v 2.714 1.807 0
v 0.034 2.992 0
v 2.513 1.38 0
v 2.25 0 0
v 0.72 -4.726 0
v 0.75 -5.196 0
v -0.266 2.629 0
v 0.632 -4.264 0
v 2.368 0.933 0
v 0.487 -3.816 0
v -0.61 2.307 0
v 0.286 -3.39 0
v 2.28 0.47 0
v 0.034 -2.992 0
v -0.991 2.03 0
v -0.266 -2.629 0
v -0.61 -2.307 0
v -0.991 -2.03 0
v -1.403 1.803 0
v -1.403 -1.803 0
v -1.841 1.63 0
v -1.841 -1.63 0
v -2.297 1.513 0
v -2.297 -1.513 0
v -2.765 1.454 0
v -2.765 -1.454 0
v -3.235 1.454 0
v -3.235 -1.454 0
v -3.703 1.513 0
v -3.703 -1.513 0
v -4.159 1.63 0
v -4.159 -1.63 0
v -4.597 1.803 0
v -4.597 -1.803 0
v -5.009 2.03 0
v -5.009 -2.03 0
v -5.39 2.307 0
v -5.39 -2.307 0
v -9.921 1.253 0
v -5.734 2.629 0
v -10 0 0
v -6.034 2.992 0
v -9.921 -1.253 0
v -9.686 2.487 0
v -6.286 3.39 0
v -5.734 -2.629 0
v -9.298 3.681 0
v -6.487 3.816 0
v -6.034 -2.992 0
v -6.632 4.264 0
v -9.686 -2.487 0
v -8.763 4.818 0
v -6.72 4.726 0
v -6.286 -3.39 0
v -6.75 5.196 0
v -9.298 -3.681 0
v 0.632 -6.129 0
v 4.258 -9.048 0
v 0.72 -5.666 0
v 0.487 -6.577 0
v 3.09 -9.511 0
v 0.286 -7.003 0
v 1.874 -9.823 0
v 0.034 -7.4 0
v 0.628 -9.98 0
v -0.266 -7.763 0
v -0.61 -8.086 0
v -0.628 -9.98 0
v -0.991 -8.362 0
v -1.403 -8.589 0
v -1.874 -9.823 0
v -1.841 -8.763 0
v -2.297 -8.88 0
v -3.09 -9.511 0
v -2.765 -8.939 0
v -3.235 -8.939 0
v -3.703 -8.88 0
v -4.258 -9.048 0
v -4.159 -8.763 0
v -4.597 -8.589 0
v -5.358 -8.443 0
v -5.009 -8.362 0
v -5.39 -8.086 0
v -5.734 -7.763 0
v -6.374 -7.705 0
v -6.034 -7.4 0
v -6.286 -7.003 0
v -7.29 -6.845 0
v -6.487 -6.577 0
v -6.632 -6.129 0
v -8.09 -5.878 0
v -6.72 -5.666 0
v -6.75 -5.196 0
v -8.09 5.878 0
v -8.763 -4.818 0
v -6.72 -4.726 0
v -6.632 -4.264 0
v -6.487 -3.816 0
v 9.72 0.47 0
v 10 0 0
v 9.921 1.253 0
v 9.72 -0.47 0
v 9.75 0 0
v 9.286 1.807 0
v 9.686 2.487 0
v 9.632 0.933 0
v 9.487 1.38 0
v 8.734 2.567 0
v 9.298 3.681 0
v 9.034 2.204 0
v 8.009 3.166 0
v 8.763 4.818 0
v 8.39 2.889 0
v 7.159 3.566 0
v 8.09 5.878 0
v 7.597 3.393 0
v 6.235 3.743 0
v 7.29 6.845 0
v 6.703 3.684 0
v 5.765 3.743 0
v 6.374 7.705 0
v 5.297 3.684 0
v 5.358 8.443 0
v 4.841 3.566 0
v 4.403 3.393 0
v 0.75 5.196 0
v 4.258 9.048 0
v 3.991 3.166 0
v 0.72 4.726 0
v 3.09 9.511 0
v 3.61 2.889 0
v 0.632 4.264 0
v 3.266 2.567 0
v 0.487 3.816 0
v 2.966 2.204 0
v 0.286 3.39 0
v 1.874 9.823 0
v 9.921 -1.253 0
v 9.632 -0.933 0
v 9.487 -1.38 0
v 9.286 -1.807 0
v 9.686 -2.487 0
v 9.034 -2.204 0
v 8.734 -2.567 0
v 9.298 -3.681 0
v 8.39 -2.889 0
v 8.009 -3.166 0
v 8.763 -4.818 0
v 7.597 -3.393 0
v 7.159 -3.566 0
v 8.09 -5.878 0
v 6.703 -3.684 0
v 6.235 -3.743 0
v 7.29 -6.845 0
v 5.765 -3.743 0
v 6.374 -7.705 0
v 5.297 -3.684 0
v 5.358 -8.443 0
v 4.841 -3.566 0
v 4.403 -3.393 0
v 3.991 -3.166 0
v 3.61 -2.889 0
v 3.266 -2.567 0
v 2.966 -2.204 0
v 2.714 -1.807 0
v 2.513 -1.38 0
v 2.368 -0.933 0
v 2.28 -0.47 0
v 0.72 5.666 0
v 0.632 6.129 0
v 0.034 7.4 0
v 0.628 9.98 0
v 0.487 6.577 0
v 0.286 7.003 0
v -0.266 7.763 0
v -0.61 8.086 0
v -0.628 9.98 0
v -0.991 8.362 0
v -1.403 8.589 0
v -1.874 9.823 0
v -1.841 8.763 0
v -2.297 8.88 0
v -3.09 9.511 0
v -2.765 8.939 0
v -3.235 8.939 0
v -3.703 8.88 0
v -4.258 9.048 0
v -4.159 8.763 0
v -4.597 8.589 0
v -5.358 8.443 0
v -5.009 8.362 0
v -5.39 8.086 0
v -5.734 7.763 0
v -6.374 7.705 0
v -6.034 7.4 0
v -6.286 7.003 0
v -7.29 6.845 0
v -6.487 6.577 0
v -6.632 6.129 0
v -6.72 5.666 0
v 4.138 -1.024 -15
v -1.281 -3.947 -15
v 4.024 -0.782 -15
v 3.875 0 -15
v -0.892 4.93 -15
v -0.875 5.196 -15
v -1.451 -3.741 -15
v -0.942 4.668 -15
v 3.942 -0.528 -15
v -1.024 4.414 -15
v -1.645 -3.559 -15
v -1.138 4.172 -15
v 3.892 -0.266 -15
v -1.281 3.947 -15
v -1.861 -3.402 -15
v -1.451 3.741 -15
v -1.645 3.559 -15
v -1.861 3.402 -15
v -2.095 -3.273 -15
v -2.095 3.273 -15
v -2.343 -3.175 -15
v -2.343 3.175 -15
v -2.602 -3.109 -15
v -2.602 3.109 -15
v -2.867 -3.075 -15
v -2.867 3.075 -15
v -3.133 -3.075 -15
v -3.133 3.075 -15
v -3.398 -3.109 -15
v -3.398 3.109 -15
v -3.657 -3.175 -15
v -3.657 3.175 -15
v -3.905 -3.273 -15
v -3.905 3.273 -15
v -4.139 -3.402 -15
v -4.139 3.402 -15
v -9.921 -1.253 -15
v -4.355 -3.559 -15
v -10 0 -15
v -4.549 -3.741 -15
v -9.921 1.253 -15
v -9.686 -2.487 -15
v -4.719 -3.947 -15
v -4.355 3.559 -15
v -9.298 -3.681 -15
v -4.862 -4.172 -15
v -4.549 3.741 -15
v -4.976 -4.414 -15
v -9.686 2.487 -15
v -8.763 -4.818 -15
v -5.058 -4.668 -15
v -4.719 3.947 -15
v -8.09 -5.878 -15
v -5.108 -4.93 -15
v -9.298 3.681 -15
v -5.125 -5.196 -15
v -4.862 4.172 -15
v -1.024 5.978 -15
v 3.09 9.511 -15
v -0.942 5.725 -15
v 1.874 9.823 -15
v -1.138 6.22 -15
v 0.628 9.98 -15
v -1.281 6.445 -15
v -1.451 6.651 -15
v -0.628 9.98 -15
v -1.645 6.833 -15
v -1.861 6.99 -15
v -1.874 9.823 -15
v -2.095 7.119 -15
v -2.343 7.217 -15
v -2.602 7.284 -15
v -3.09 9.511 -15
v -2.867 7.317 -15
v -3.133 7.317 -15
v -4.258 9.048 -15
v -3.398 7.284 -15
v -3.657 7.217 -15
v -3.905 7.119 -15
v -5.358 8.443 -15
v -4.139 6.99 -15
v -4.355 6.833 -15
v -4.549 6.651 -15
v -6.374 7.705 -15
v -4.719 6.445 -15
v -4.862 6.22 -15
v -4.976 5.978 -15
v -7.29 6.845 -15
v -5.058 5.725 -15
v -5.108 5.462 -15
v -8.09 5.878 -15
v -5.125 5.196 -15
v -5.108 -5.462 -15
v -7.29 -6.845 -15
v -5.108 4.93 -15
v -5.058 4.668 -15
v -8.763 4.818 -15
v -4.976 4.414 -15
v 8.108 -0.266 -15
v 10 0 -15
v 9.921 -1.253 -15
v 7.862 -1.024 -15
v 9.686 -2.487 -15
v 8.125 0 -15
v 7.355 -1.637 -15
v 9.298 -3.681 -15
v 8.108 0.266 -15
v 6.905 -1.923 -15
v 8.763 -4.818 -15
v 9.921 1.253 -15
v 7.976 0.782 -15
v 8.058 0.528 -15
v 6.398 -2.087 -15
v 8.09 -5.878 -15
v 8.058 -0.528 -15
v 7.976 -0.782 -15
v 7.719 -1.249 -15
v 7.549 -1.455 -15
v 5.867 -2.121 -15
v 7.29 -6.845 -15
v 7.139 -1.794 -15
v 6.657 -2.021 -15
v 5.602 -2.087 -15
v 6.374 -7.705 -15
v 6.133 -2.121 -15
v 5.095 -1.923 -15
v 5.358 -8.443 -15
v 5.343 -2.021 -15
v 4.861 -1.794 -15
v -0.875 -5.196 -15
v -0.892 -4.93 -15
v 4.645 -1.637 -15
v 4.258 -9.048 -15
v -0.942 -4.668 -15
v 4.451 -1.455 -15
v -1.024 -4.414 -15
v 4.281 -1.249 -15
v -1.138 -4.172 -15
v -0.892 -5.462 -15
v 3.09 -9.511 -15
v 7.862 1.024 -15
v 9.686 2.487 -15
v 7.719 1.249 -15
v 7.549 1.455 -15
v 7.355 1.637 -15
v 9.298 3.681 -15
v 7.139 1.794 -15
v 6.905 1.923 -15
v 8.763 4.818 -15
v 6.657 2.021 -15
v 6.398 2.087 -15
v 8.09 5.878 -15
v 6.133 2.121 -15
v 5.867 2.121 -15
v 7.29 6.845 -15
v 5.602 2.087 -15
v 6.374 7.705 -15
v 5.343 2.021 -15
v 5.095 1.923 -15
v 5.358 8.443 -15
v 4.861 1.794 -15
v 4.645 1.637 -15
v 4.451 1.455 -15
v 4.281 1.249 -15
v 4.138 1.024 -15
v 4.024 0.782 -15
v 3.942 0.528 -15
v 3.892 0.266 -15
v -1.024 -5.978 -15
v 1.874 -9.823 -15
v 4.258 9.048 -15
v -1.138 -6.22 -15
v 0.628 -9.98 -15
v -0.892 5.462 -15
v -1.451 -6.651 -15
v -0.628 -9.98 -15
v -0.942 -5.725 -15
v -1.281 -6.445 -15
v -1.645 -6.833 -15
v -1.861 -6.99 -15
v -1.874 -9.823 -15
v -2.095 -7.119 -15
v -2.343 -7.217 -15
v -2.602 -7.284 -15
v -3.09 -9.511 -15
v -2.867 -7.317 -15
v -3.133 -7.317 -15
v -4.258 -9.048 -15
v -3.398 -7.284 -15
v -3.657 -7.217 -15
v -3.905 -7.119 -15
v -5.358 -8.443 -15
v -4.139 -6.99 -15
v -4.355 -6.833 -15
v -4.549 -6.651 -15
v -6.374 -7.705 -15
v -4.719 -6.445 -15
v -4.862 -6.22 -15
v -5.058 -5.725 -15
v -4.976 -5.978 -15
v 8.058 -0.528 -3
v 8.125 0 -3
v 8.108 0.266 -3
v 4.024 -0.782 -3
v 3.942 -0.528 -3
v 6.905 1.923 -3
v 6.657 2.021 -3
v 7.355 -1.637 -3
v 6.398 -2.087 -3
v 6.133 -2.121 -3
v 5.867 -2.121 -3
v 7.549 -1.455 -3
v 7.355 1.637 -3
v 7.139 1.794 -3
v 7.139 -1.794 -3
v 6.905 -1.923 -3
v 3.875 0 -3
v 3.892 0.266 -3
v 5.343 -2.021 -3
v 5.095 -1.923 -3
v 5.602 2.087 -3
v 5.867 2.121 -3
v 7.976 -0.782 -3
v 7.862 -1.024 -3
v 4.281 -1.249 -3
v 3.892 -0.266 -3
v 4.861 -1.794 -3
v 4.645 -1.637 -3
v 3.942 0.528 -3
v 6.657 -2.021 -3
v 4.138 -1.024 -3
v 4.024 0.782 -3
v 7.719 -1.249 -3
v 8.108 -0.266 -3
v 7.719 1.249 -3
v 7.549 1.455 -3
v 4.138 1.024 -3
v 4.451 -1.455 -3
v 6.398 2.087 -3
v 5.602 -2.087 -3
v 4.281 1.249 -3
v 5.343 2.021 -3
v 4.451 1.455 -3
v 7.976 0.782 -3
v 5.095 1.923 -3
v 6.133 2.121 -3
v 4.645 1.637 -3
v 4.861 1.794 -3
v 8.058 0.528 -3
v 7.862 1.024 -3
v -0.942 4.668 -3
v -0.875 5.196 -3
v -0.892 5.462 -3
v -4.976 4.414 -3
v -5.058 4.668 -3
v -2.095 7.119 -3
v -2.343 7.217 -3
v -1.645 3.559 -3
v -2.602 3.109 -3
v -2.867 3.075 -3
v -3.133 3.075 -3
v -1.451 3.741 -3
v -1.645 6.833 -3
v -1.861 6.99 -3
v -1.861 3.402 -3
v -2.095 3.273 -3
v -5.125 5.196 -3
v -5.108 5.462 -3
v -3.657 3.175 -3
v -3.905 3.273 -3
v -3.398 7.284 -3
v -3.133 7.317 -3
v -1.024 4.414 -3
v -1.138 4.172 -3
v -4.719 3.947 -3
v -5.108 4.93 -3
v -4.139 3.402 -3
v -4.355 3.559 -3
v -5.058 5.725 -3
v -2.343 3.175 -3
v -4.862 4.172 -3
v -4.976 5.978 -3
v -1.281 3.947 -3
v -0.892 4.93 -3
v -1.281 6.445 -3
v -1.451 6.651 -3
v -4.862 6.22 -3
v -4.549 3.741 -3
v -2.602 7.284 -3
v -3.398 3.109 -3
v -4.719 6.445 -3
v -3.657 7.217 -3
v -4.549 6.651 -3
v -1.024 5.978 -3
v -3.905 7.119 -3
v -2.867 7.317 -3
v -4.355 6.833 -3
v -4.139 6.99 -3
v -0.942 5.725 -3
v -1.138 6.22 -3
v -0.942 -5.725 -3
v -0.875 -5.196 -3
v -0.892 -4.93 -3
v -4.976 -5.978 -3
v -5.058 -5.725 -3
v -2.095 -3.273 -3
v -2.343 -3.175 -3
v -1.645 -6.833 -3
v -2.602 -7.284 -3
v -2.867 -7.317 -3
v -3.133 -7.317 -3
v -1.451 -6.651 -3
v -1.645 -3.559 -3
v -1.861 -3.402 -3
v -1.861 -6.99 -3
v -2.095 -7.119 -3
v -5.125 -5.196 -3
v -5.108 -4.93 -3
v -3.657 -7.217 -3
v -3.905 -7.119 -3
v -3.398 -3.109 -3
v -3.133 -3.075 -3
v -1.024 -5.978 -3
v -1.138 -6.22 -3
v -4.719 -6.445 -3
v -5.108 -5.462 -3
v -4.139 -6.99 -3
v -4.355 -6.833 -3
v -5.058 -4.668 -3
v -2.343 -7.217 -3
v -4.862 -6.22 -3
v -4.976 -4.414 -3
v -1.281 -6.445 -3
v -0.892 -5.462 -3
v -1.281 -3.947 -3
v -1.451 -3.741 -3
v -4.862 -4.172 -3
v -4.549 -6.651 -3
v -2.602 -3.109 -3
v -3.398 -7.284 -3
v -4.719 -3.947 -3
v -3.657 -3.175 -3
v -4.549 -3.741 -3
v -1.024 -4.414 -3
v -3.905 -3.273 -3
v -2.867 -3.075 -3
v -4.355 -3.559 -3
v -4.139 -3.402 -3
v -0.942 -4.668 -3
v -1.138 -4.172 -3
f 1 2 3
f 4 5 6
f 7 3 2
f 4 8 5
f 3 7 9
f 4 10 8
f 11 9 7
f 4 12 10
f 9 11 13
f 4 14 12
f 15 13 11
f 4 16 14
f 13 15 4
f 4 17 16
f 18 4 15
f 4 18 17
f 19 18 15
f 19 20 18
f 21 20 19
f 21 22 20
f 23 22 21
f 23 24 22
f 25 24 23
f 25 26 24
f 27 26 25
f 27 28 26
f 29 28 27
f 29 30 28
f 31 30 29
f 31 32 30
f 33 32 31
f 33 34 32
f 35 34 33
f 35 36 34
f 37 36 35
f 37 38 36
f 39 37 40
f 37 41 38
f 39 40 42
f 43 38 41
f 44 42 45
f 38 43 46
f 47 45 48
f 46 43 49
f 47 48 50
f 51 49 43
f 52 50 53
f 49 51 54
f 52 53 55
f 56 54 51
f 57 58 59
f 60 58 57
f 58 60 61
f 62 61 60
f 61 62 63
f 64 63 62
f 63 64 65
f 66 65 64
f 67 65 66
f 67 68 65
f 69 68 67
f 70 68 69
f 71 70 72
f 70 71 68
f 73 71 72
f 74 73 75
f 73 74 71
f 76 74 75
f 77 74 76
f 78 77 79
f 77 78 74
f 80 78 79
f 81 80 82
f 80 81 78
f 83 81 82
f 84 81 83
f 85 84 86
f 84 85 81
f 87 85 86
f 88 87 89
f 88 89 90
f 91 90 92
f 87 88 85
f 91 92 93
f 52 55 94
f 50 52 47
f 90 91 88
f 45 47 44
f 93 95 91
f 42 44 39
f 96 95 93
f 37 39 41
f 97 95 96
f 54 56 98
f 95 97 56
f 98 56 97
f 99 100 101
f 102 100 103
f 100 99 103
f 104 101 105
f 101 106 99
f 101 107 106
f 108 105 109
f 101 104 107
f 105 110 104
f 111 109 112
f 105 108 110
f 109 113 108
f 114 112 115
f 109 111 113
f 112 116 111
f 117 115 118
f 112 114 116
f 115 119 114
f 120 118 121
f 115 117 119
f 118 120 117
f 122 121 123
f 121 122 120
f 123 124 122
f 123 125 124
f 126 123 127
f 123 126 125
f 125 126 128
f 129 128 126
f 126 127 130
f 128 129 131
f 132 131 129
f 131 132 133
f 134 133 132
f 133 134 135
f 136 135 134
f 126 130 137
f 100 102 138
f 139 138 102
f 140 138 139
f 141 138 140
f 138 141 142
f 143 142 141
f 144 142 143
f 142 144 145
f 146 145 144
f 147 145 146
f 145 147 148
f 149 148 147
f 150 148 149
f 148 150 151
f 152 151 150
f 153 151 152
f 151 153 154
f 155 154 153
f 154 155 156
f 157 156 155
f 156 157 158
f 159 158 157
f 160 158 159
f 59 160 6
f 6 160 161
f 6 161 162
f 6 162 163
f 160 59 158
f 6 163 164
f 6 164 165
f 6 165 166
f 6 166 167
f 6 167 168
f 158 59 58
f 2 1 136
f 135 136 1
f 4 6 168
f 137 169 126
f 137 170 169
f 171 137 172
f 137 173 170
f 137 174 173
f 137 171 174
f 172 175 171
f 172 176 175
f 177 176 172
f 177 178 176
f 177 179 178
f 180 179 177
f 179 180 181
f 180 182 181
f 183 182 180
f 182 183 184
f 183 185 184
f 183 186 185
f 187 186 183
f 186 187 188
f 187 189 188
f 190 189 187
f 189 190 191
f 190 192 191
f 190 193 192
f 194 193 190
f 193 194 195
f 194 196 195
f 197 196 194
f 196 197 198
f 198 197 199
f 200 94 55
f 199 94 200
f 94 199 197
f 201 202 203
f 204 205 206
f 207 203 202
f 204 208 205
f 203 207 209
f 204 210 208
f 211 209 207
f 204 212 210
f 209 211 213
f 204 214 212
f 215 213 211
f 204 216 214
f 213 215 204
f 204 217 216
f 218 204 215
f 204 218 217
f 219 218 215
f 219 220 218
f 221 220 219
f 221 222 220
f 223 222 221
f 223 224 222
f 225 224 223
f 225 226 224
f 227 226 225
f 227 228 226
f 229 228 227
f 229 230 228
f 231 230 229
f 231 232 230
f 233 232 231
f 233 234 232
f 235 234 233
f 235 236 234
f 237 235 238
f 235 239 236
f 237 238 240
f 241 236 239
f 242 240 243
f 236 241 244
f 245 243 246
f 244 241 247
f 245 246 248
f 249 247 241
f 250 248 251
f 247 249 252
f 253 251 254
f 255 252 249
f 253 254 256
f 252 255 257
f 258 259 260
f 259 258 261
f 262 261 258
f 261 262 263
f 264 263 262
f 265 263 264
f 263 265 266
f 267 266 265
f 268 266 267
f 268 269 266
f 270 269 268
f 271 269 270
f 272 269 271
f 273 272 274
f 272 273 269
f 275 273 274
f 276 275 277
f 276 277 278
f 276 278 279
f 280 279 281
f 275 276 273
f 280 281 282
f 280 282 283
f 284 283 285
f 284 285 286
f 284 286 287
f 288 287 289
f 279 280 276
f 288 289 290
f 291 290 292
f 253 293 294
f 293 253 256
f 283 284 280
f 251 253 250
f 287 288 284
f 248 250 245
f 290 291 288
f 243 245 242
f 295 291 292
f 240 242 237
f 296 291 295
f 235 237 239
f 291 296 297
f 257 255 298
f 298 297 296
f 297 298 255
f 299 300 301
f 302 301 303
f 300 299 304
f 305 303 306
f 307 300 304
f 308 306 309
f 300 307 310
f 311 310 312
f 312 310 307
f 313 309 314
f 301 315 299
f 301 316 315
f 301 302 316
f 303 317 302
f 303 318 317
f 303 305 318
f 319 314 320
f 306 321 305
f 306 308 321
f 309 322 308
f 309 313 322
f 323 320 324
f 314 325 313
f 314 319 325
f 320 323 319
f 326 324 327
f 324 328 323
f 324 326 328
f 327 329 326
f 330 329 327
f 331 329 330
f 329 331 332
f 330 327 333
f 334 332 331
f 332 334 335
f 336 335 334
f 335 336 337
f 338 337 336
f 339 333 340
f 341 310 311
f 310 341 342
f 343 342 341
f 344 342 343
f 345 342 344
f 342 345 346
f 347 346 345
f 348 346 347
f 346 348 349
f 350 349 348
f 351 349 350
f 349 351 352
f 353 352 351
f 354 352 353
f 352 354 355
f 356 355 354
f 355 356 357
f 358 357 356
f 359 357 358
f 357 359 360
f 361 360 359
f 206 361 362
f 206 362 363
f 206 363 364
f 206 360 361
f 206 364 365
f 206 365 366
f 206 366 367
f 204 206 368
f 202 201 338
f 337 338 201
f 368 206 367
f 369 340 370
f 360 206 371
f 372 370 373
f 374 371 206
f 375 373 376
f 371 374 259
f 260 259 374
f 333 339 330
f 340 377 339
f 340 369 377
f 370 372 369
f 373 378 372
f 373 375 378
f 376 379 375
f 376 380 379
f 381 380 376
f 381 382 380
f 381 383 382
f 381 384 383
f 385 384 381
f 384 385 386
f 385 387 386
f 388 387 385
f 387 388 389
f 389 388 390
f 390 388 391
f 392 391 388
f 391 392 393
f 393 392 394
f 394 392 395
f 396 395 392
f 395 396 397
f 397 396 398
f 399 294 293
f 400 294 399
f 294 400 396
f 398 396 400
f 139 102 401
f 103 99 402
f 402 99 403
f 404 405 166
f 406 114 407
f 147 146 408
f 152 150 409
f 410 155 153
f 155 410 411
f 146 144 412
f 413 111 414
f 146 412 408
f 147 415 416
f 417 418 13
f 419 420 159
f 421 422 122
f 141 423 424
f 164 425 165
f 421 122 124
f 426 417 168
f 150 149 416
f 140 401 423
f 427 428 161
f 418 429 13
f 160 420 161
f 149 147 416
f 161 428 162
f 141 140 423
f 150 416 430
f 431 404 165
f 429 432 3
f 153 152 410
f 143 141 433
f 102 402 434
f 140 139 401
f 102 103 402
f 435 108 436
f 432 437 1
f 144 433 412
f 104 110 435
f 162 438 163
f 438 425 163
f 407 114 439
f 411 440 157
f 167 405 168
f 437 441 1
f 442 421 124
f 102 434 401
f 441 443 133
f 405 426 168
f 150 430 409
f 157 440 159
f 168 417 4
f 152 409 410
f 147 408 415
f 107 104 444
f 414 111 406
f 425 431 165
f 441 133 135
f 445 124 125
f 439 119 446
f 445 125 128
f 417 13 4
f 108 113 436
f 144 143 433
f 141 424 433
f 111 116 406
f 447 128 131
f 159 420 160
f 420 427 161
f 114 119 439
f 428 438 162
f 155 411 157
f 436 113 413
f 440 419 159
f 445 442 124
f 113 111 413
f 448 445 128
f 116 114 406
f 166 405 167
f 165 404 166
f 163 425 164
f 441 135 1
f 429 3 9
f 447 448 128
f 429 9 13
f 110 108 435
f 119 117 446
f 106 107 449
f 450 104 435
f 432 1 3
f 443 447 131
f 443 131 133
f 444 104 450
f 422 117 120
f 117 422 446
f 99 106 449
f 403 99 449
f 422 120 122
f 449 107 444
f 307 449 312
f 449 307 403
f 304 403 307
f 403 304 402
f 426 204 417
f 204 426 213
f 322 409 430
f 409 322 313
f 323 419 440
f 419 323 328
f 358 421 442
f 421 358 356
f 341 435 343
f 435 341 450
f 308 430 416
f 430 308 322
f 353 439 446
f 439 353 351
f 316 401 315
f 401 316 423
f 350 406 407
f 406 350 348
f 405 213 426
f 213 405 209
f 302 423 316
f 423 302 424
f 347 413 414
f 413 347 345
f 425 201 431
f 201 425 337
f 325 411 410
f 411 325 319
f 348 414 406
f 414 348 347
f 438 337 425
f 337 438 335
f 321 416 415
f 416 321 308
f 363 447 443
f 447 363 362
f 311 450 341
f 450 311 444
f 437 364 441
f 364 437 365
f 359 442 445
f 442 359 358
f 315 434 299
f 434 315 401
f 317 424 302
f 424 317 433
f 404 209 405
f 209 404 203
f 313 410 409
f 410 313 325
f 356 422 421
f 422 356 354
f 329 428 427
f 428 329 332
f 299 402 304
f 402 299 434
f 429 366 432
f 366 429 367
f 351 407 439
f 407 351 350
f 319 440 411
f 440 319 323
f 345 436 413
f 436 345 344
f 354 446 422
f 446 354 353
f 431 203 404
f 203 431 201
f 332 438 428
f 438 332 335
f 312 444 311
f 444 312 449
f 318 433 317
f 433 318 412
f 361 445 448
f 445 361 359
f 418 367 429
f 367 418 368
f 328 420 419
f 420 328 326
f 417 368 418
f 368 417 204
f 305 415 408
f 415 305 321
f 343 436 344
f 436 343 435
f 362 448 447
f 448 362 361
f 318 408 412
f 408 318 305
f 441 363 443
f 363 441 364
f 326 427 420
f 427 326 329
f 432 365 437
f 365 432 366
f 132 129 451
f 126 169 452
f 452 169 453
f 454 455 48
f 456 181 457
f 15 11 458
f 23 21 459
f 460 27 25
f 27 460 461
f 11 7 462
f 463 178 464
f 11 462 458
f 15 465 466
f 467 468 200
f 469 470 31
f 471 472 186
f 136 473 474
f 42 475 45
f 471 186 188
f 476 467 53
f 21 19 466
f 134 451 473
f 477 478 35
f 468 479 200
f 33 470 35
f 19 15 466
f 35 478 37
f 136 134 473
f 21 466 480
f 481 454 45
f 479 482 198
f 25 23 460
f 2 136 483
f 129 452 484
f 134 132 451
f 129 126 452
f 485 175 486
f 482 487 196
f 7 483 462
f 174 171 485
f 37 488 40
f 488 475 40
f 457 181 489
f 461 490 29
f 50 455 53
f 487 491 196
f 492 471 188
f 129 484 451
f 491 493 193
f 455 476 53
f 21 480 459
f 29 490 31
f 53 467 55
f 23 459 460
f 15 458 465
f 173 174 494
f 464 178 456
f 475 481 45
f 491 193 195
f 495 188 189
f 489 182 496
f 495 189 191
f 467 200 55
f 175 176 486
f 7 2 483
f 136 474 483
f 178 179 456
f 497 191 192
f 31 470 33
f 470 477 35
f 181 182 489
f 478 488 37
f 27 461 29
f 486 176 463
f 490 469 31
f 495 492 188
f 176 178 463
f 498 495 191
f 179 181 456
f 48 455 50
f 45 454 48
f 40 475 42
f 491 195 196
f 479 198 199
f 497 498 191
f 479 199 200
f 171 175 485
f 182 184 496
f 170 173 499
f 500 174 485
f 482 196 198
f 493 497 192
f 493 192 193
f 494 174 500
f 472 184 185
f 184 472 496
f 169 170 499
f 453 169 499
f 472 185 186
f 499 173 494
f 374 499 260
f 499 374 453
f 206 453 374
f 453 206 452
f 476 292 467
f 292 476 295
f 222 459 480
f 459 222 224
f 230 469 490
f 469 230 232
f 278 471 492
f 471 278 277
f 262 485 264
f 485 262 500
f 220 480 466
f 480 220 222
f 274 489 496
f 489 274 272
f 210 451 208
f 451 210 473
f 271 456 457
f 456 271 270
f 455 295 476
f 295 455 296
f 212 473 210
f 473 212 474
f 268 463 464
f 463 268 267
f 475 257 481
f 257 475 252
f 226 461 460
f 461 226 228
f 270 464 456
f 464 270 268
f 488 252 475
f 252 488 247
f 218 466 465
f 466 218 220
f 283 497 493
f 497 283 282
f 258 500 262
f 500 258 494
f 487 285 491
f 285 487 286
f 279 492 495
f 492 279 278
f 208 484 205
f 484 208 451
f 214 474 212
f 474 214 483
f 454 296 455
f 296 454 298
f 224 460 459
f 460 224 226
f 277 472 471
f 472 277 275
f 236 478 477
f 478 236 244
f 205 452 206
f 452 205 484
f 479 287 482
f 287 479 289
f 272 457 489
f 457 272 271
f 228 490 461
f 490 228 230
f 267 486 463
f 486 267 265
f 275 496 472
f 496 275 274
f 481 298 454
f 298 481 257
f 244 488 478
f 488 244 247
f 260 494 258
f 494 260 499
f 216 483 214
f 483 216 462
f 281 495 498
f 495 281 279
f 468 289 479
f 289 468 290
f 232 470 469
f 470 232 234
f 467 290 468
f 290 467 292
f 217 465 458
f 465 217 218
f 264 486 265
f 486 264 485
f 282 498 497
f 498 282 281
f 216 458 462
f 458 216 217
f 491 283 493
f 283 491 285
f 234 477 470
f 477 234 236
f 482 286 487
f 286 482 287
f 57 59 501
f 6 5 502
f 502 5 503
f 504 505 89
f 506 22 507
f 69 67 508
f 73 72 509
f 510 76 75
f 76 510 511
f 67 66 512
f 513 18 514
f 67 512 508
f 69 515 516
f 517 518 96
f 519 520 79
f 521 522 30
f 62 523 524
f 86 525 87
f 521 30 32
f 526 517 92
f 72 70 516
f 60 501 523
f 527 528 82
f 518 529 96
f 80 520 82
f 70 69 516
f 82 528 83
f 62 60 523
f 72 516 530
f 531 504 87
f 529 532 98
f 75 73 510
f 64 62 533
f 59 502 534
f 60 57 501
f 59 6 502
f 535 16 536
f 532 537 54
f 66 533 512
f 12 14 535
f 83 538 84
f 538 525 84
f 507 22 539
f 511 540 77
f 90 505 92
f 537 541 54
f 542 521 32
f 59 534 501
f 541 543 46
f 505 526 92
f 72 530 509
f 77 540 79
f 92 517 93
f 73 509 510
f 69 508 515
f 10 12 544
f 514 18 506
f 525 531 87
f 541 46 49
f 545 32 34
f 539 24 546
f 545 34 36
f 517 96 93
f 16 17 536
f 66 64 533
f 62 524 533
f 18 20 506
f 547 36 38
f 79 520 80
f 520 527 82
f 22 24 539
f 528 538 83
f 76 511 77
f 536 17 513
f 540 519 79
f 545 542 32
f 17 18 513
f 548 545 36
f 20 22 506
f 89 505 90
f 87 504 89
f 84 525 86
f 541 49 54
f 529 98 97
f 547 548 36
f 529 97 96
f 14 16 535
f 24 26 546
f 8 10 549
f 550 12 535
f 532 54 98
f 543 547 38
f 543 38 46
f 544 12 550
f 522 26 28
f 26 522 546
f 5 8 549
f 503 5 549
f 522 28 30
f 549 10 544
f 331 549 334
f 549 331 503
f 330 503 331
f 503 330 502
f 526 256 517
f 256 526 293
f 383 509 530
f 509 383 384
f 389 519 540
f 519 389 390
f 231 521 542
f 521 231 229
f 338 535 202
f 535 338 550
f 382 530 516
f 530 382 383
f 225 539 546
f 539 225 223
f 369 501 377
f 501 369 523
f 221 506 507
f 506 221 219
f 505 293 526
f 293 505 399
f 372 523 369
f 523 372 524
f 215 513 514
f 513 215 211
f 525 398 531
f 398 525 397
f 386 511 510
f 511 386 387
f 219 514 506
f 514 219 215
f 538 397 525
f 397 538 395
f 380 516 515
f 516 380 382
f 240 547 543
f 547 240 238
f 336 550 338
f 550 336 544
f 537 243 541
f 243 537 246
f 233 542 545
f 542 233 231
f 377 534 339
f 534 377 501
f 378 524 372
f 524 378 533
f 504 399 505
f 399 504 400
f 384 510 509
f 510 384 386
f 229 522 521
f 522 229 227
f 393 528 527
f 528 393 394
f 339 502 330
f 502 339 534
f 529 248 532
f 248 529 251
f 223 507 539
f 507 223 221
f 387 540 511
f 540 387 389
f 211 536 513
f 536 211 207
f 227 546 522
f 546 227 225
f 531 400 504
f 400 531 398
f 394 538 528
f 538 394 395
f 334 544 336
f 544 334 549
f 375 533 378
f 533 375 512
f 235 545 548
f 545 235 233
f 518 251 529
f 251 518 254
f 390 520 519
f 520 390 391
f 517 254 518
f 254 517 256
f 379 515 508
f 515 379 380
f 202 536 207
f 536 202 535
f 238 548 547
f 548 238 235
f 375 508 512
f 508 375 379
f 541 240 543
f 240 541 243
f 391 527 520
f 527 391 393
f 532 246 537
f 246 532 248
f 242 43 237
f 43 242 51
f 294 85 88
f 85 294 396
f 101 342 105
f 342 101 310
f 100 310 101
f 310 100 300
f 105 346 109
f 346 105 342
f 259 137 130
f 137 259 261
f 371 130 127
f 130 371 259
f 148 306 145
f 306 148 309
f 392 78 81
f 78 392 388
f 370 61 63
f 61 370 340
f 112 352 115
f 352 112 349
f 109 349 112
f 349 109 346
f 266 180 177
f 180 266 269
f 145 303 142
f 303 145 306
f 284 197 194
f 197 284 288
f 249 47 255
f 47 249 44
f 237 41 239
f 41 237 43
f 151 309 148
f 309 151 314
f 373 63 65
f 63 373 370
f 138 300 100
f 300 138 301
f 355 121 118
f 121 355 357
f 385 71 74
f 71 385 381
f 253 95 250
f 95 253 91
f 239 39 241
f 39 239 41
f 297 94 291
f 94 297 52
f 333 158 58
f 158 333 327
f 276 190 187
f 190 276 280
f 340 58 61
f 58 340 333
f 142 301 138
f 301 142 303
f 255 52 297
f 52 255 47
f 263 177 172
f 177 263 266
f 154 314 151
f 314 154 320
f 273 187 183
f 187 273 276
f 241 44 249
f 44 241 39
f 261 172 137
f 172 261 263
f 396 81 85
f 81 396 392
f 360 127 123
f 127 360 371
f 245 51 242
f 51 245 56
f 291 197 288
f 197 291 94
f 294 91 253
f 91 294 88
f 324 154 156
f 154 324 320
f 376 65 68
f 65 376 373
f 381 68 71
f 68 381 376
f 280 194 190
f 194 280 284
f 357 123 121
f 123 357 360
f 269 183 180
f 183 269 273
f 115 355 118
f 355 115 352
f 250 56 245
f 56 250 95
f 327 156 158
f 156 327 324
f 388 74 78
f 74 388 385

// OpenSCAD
$fn = 50;


difference() {
	union() {
		translate(v = [0, 0, -15.0000000000]) {
			cylinder(h = 15, r = 10.0000000000);
		}
	}
	union() {
		translate(v = [6.0000000000, 0.0000000000, 0]) {
			rotate(a = [0, 0, 0]) {
				difference() {
					union() {
						#translate(v = [0, 0, -15.0000000000]) {
							cylinder(h = 15, r = 2.0000000000);
						}
						#translate(v = [0, 0, -3]) {
							cylinder(h = 3, r = 10.0000000000, r1 = 2.1250000000, r2 = 3.7500000000);
						}
						#translate(v = [0, 0, -15.0000000000]) {
							cylinder(h = 15, r = 2.1250000000);
						}
						#translate(v = [0, 0, -15.0000000000]) {
							cylinder(h = 15, r = 2.0000000000);
						}
					}
					union();
				}
			}
		}
		translate(v = [-3.0000000000, 5.1961524227, 0]) {
			rotate(a = [0, 0, 0]) {
				difference() {
					union() {
						#translate(v = [0, 0, -15.0000000000]) {
							cylinder(h = 15, r = 2.0000000000);
						}
						#translate(v = [0, 0, -3]) {
							cylinder(h = 3, r = 10.0000000000, r1 = 2.1250000000, r2 = 3.7500000000);
						}
						#translate(v = [0, 0, -15.0000000000]) {
							cylinder(h = 15, r = 2.1250000000);
						}
						#translate(v = [0, 0, -15.0000000000]) {
							cylinder(h = 15, r = 2.0000000000);
						}
					}
					union();
				}
			}
		}
		translate(v = [-3.0000000000, -5.1961524227, 0]) {
			rotate(a = [0, 0, 0]) {
				difference() {
					union() {
						#translate(v = [0, 0, -15.0000000000]) {
							cylinder(h = 15, r = 2.0000000000);
						}
						#translate(v = [0, 0, -3]) {
							cylinder(h = 3, r = 10.0000000000, r1 = 2.1250000000, r2 = 3.7500000000);
						}
						#translate(v = [0, 0, -15.0000000000]) {
							cylinder(h = 15, r = 2.1250000000);
						}
						#translate(v = [0, 0, -15.0000000000]) {
							cylinder(h = 15, r = 2.0000000000);
						}
					}
					union();
				}
			}
		}
	}
}
